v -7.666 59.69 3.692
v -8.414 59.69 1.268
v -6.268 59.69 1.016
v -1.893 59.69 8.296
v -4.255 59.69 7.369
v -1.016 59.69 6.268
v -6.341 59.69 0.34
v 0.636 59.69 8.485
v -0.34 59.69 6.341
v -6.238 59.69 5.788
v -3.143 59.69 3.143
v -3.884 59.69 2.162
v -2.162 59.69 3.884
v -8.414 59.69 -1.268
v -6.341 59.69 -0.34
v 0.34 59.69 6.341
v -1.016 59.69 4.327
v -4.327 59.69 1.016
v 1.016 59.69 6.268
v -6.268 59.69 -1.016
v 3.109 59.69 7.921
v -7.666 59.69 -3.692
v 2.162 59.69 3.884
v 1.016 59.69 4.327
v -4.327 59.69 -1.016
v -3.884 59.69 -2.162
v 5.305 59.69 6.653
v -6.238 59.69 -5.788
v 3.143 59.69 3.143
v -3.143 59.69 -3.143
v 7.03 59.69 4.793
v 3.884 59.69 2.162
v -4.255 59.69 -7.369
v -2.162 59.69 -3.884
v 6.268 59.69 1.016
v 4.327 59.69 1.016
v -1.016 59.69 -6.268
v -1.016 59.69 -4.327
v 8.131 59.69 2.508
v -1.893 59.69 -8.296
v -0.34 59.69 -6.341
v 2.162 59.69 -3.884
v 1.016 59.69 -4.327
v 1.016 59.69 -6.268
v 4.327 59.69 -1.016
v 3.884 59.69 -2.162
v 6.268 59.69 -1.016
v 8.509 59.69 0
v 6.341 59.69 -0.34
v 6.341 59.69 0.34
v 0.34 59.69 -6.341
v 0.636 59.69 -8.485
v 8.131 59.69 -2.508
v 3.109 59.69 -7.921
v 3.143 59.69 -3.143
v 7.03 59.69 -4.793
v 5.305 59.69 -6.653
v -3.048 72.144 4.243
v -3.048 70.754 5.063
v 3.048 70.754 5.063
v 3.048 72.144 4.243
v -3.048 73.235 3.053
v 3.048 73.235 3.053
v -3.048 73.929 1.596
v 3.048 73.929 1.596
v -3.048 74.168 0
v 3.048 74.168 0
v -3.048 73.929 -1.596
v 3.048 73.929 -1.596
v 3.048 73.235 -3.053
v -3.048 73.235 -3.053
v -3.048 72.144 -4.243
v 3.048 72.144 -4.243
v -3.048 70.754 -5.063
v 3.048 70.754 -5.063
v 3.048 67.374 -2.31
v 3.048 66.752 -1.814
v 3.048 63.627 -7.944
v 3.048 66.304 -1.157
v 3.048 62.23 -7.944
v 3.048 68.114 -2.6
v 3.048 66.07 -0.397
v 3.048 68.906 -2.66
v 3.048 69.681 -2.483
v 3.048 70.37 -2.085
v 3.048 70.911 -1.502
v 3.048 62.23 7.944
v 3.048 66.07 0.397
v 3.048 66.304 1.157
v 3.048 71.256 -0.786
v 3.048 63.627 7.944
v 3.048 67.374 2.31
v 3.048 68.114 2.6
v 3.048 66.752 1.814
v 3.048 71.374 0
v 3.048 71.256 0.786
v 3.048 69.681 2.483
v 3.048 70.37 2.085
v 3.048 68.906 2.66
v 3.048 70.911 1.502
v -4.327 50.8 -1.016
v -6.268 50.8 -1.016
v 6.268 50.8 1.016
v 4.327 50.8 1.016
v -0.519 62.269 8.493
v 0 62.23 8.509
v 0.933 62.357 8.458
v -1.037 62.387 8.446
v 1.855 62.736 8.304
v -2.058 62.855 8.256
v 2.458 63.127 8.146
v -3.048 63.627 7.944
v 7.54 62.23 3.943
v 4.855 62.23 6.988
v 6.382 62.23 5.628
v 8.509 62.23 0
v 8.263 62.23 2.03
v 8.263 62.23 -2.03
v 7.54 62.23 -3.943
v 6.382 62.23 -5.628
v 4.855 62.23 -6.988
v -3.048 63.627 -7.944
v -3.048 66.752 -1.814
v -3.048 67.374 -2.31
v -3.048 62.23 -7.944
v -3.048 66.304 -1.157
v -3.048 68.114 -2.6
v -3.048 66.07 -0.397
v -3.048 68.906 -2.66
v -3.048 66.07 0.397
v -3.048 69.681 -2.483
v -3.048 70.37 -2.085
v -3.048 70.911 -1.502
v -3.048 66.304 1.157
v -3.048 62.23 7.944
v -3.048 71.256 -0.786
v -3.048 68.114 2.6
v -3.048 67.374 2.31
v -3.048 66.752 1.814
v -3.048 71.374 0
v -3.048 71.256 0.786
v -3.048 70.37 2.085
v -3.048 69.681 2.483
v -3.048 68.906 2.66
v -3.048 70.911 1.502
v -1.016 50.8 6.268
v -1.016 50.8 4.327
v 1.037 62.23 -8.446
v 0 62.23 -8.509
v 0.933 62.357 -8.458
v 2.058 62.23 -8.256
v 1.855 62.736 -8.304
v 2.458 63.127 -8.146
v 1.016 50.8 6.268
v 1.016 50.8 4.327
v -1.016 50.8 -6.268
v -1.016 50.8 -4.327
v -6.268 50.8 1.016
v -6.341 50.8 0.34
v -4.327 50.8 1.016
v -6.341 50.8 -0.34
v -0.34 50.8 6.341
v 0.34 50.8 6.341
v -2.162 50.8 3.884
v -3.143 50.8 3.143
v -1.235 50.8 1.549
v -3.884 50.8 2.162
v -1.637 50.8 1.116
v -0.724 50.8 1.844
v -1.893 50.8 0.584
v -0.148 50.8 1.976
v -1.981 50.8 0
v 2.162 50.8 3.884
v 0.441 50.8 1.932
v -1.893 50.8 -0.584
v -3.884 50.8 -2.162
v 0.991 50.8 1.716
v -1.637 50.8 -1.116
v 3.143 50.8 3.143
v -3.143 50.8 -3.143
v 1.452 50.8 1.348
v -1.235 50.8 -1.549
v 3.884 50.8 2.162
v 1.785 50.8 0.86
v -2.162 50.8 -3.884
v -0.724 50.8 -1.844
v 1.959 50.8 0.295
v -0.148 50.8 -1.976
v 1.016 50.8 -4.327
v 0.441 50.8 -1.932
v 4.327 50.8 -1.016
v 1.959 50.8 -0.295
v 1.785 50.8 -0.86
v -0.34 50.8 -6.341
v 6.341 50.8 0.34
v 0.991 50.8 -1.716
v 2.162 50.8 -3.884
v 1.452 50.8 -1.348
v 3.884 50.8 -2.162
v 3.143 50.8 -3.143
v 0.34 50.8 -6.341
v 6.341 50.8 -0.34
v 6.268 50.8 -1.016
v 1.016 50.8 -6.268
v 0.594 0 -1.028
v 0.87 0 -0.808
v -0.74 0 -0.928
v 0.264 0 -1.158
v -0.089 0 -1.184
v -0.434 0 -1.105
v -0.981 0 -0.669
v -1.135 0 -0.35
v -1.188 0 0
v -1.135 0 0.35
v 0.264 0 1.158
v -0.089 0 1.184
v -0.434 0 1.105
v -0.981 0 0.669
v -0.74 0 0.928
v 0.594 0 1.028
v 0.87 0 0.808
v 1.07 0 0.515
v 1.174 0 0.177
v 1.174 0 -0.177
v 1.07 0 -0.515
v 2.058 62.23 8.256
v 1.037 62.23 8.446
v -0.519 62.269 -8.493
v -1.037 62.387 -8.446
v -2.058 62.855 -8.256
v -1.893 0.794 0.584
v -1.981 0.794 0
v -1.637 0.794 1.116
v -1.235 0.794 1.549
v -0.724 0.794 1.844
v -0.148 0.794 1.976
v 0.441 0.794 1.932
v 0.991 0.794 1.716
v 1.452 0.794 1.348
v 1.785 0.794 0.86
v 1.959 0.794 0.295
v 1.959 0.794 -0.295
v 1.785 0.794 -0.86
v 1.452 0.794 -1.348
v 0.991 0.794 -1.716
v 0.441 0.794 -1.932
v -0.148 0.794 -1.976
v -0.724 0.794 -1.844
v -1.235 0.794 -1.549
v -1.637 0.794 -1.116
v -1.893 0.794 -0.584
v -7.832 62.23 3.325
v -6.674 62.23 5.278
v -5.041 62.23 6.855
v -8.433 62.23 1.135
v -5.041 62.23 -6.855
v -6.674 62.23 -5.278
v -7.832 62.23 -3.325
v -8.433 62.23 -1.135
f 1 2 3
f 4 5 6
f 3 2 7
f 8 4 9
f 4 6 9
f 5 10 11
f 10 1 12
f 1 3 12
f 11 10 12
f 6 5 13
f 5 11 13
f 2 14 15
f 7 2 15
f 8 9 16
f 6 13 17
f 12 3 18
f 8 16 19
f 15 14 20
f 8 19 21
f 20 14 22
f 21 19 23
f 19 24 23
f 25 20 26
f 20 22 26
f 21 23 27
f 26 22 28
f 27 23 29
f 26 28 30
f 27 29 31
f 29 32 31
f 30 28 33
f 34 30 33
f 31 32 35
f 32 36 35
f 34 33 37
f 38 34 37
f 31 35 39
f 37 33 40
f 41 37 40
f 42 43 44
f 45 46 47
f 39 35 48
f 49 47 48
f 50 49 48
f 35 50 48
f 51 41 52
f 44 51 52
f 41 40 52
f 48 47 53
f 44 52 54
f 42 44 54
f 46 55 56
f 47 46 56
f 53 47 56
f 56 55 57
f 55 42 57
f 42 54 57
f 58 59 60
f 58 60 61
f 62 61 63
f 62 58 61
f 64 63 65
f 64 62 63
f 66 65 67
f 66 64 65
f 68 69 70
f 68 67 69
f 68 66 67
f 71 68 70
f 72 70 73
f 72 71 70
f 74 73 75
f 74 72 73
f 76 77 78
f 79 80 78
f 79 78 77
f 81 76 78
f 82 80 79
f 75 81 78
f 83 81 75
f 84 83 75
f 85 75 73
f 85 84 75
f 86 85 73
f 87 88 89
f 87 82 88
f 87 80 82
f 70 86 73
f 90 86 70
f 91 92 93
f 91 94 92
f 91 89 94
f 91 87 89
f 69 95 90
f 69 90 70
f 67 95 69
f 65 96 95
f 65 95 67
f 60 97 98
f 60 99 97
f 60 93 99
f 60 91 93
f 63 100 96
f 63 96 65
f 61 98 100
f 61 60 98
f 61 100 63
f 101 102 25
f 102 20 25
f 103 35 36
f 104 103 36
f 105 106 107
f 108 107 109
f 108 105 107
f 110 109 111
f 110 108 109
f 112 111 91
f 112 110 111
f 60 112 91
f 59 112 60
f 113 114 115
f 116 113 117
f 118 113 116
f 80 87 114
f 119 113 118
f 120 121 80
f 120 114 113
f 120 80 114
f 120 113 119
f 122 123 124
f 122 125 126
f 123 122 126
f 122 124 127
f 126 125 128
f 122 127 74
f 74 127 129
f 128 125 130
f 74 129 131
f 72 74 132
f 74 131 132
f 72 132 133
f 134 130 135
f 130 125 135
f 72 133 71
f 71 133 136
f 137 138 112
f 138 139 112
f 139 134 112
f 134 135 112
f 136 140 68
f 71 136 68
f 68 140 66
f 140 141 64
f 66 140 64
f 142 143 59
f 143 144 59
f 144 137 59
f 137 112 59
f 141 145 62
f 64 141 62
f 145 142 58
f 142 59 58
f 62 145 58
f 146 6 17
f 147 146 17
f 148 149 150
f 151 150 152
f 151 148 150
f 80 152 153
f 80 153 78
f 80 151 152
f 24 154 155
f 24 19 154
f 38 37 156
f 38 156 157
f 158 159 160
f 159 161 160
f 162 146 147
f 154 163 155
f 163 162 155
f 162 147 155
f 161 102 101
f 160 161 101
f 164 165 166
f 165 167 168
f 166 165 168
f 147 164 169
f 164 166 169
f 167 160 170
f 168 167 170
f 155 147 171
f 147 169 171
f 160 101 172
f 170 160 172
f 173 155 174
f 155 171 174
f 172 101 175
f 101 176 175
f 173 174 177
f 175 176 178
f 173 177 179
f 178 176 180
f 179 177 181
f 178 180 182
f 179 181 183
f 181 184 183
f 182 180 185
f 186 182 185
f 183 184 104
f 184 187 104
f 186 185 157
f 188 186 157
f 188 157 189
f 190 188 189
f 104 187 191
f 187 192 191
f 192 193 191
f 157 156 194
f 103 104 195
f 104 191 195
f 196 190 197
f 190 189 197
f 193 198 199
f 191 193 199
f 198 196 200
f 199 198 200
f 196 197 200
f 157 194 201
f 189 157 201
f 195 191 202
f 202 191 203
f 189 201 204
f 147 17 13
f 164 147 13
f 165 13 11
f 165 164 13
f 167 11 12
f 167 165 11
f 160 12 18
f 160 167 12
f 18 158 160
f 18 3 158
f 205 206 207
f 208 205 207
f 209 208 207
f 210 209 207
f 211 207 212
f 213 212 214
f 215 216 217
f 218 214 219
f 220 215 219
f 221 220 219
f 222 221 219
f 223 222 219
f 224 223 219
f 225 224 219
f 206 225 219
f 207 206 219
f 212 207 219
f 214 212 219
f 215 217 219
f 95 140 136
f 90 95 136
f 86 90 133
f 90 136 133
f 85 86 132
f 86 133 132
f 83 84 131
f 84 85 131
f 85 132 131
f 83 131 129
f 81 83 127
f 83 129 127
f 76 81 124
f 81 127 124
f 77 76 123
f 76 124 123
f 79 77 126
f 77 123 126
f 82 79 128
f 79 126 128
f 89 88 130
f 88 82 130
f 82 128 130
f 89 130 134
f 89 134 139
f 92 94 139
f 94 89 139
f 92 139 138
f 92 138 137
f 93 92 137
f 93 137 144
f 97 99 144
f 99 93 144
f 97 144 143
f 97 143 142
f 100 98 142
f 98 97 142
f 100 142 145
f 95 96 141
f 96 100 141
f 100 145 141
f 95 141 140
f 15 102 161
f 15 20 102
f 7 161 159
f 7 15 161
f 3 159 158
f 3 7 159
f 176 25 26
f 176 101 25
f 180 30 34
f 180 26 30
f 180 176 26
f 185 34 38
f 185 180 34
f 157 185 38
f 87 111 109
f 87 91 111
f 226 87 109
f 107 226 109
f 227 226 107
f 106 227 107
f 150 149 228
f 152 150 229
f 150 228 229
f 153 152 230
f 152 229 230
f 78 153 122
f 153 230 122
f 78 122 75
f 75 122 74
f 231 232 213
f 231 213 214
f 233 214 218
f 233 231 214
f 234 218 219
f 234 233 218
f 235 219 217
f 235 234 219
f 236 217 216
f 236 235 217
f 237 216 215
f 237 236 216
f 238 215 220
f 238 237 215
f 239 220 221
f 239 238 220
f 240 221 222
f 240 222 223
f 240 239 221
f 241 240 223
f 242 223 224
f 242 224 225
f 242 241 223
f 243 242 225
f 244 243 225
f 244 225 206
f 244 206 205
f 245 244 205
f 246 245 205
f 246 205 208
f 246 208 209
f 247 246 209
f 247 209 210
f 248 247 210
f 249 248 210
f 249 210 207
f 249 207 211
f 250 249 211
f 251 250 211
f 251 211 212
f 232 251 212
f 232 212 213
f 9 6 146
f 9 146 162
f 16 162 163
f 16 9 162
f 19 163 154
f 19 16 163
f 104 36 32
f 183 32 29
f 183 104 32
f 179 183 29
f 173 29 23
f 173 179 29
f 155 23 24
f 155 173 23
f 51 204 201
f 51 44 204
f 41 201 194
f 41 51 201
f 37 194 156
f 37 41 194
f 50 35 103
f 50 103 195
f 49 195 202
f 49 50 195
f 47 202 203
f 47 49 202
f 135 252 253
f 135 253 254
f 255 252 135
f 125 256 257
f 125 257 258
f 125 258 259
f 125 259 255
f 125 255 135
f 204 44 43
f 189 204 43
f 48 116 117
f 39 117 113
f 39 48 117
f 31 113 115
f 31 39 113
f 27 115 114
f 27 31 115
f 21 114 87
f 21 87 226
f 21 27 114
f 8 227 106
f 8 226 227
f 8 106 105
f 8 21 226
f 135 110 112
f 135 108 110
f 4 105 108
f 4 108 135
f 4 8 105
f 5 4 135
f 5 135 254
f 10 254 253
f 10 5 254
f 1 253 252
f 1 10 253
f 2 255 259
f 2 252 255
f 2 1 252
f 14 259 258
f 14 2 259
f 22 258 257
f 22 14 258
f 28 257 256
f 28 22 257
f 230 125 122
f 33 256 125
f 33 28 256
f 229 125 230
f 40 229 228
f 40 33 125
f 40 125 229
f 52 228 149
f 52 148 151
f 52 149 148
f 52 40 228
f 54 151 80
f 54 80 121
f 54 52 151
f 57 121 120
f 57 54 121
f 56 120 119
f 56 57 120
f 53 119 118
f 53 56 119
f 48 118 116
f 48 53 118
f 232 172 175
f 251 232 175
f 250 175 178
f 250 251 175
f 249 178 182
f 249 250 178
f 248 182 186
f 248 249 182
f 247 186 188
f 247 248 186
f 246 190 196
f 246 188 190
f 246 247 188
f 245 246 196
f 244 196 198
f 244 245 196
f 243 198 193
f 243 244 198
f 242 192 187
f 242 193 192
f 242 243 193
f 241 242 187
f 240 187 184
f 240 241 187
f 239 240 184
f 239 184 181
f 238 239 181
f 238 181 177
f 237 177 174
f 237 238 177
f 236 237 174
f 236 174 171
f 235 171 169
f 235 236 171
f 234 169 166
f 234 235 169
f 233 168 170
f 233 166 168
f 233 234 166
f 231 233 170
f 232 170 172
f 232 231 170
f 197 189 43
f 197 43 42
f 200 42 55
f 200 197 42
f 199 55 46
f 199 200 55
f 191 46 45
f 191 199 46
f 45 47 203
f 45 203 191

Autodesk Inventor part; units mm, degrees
ref_plane "YZ Plane" through (0, 0, 0) normal (1, 0, 0) x (0, 1, 0)
ref_plane "XZ Plane" through (0, 0, 0) normal (0, 1, 0) x (-1, 0, 0)
sketch "Sketch2" plane through (0, 0, 0) normal (0, 1, 0) x (-1, 0, 0)
  circle A0 centre (0, 0) radius 1.9812
  dimension "d0" = 3.9624
extrude "Extrusion1" add sketch "Sketch2" along normal blind 50.8
chamfer "Chamfer1" distance 0.7937 angle 45 1 edges at (1.9812, 0, 0)
sketch "Sketch3" plane through (0, 50.8, 0) normal (0, 1, 0) x (1, 0, 0)
  circle A0 centre (0, 0) radius 1.9812 projected
  circle A1 centre (0, 0) radius 4.445
  dimension "d6" = 8.89
extrude "Extrusion2" add sketch "Sketch3" along normal blind 8.89 contours A0 | A1
sketch "Sketch4" plane through (0, 59.69, 0) normal (0, 1, 0) x (1, 0, 0)
  circle A0 centre (0, 0) radius 4.445 projected
  circle A1 centre (0, 0) radius 8.509
  dimension "d9" = 17.018
extrude "Extrusion3" add sketch "Sketch4" along normal blind 2.54 contours A0 | A1
sketch "Sketch5" plane through (0, 0, 0) normal (1, 0, 0) x (0, 1, 0)
  circle A0 centre (68.707, 0) radius 2.667
  arc A1 (70.7539, -5.0629) -> (70.7539, 5.0629) centre (68.707, 0) ccw
  line L0 (59.69, 8.509) -> (62.23, 8.509) projected
  line L1 (62.23, 8.509) -> (62.23, -8.509) projected
  line L2 (59.69, -8.509) -> (62.23, -8.509) projected
  line L3 (62.23, 8.509) -> (62.23, -8.509)
  line L4 (62.23, -8.509) -> (70.7539, -5.0629)
  line L5 (62.23, 8.509) -> (70.7539, 5.0629)
  line L6 (37.7029, 0) -> (42.6845, 0) construction
  line L7 (74.168, 5.5293) -> (74.168, -0.3965) construction
  point P0 (0, 0)
  dimension "d12" = 5.334
  dimension "d13" = 10.922
  dimension "d14" = 11.938
extrude "Extrusion4" add sketch "Sketch5" along normal mid plane 6.096
sketch "Sketch6" plane through (0, 62.23, 0) normal (0, 1, 0) x (1, 0, 0)
  arc A0 (3.048, -7.9444) -> (3.048, 7.9444) centre (0, 0) ccw projected
  circle A1 centre (0, 0) radius 8.509
  circle A2 centre (0, 0) radius 9.0384
  point P0 (-3.048, 8.509)
extrude "Extrusion5" cut sketch "Sketch6" along normal blind 12.7
sketch "Sketch7" plane through (0, 59.69, 0) normal (0, -1, 0) x (1, 0, 0)
  circle A0 centre (0, 0) radius 8.509 projected
  circle A1 centre (0, 0) radius 4.445 projected
  arc A2 (-4.3273, 1.016) -> (-4.3273, -1.016) centre (0, 0) ccw
  circle A3 centre (0, 0) radius 4.445 projected
  arc A4 (-6.2682, 1.016) -> (-6.2682, -1.016) centre (0, 0) ccw
  line L0 (-6.2682, 1.016) -> (-4.3273, 1.016)
  line L1 (-6.2682, -1.016) -> (-4.3273, -1.016)
  arc A5 (-1.016, -4.3273) -> (1.016, -4.3273) centre (0, 0) ccw
  arc A6 (-1.016, -6.2682) -> (1.016, -6.2682) centre (0, 0) ccw
  line L2 (-1.016, -6.2682) -> (-1.016, -4.3273)
  line L3 (1.016, -6.2682) -> (1.016, -4.3273)
  arc A7 (4.3273, -1.016) -> (4.3273, 1.016) centre (0, 0) ccw
  arc A8 (6.2682, -1.016) -> (6.2682, 1.016) centre (0, 0) ccw
  line L4 (6.2682, -1.016) -> (4.3273, -1.016)
  line L5 (6.2682, 1.016) -> (4.3273, 1.016)
  arc A9 (1.016, 4.3273) -> (-1.016, 4.3273) centre (0, 0) ccw
  arc A10 (1.016, 6.2682) -> (-1.016, 6.2682) centre (0, 0) ccw
  line L6 (1.016, 6.2682) -> (1.016, 4.3273)
  line L7 (-1.016, 6.2682) -> (-1.016, 4.3273)
  dimension "d19" = 12.7
  dimension "d20" = 2.032
  dimension "d21" = 1.016
  dimension "d24" = 360
extrude "Extrusion6" add sketch "Sketch7" along normal blind 8.89 contours A1 L5 A8 L4 | A1 L7 A10 L6 | L3 A6 L2 A1 | A1 L1 A4 L0
ref_plane "Work Plane1" through (0, 74.168, 0) normal (0, 1, 0) x (-1, 0, 0)
properties part number "Shock Mount - Top"
